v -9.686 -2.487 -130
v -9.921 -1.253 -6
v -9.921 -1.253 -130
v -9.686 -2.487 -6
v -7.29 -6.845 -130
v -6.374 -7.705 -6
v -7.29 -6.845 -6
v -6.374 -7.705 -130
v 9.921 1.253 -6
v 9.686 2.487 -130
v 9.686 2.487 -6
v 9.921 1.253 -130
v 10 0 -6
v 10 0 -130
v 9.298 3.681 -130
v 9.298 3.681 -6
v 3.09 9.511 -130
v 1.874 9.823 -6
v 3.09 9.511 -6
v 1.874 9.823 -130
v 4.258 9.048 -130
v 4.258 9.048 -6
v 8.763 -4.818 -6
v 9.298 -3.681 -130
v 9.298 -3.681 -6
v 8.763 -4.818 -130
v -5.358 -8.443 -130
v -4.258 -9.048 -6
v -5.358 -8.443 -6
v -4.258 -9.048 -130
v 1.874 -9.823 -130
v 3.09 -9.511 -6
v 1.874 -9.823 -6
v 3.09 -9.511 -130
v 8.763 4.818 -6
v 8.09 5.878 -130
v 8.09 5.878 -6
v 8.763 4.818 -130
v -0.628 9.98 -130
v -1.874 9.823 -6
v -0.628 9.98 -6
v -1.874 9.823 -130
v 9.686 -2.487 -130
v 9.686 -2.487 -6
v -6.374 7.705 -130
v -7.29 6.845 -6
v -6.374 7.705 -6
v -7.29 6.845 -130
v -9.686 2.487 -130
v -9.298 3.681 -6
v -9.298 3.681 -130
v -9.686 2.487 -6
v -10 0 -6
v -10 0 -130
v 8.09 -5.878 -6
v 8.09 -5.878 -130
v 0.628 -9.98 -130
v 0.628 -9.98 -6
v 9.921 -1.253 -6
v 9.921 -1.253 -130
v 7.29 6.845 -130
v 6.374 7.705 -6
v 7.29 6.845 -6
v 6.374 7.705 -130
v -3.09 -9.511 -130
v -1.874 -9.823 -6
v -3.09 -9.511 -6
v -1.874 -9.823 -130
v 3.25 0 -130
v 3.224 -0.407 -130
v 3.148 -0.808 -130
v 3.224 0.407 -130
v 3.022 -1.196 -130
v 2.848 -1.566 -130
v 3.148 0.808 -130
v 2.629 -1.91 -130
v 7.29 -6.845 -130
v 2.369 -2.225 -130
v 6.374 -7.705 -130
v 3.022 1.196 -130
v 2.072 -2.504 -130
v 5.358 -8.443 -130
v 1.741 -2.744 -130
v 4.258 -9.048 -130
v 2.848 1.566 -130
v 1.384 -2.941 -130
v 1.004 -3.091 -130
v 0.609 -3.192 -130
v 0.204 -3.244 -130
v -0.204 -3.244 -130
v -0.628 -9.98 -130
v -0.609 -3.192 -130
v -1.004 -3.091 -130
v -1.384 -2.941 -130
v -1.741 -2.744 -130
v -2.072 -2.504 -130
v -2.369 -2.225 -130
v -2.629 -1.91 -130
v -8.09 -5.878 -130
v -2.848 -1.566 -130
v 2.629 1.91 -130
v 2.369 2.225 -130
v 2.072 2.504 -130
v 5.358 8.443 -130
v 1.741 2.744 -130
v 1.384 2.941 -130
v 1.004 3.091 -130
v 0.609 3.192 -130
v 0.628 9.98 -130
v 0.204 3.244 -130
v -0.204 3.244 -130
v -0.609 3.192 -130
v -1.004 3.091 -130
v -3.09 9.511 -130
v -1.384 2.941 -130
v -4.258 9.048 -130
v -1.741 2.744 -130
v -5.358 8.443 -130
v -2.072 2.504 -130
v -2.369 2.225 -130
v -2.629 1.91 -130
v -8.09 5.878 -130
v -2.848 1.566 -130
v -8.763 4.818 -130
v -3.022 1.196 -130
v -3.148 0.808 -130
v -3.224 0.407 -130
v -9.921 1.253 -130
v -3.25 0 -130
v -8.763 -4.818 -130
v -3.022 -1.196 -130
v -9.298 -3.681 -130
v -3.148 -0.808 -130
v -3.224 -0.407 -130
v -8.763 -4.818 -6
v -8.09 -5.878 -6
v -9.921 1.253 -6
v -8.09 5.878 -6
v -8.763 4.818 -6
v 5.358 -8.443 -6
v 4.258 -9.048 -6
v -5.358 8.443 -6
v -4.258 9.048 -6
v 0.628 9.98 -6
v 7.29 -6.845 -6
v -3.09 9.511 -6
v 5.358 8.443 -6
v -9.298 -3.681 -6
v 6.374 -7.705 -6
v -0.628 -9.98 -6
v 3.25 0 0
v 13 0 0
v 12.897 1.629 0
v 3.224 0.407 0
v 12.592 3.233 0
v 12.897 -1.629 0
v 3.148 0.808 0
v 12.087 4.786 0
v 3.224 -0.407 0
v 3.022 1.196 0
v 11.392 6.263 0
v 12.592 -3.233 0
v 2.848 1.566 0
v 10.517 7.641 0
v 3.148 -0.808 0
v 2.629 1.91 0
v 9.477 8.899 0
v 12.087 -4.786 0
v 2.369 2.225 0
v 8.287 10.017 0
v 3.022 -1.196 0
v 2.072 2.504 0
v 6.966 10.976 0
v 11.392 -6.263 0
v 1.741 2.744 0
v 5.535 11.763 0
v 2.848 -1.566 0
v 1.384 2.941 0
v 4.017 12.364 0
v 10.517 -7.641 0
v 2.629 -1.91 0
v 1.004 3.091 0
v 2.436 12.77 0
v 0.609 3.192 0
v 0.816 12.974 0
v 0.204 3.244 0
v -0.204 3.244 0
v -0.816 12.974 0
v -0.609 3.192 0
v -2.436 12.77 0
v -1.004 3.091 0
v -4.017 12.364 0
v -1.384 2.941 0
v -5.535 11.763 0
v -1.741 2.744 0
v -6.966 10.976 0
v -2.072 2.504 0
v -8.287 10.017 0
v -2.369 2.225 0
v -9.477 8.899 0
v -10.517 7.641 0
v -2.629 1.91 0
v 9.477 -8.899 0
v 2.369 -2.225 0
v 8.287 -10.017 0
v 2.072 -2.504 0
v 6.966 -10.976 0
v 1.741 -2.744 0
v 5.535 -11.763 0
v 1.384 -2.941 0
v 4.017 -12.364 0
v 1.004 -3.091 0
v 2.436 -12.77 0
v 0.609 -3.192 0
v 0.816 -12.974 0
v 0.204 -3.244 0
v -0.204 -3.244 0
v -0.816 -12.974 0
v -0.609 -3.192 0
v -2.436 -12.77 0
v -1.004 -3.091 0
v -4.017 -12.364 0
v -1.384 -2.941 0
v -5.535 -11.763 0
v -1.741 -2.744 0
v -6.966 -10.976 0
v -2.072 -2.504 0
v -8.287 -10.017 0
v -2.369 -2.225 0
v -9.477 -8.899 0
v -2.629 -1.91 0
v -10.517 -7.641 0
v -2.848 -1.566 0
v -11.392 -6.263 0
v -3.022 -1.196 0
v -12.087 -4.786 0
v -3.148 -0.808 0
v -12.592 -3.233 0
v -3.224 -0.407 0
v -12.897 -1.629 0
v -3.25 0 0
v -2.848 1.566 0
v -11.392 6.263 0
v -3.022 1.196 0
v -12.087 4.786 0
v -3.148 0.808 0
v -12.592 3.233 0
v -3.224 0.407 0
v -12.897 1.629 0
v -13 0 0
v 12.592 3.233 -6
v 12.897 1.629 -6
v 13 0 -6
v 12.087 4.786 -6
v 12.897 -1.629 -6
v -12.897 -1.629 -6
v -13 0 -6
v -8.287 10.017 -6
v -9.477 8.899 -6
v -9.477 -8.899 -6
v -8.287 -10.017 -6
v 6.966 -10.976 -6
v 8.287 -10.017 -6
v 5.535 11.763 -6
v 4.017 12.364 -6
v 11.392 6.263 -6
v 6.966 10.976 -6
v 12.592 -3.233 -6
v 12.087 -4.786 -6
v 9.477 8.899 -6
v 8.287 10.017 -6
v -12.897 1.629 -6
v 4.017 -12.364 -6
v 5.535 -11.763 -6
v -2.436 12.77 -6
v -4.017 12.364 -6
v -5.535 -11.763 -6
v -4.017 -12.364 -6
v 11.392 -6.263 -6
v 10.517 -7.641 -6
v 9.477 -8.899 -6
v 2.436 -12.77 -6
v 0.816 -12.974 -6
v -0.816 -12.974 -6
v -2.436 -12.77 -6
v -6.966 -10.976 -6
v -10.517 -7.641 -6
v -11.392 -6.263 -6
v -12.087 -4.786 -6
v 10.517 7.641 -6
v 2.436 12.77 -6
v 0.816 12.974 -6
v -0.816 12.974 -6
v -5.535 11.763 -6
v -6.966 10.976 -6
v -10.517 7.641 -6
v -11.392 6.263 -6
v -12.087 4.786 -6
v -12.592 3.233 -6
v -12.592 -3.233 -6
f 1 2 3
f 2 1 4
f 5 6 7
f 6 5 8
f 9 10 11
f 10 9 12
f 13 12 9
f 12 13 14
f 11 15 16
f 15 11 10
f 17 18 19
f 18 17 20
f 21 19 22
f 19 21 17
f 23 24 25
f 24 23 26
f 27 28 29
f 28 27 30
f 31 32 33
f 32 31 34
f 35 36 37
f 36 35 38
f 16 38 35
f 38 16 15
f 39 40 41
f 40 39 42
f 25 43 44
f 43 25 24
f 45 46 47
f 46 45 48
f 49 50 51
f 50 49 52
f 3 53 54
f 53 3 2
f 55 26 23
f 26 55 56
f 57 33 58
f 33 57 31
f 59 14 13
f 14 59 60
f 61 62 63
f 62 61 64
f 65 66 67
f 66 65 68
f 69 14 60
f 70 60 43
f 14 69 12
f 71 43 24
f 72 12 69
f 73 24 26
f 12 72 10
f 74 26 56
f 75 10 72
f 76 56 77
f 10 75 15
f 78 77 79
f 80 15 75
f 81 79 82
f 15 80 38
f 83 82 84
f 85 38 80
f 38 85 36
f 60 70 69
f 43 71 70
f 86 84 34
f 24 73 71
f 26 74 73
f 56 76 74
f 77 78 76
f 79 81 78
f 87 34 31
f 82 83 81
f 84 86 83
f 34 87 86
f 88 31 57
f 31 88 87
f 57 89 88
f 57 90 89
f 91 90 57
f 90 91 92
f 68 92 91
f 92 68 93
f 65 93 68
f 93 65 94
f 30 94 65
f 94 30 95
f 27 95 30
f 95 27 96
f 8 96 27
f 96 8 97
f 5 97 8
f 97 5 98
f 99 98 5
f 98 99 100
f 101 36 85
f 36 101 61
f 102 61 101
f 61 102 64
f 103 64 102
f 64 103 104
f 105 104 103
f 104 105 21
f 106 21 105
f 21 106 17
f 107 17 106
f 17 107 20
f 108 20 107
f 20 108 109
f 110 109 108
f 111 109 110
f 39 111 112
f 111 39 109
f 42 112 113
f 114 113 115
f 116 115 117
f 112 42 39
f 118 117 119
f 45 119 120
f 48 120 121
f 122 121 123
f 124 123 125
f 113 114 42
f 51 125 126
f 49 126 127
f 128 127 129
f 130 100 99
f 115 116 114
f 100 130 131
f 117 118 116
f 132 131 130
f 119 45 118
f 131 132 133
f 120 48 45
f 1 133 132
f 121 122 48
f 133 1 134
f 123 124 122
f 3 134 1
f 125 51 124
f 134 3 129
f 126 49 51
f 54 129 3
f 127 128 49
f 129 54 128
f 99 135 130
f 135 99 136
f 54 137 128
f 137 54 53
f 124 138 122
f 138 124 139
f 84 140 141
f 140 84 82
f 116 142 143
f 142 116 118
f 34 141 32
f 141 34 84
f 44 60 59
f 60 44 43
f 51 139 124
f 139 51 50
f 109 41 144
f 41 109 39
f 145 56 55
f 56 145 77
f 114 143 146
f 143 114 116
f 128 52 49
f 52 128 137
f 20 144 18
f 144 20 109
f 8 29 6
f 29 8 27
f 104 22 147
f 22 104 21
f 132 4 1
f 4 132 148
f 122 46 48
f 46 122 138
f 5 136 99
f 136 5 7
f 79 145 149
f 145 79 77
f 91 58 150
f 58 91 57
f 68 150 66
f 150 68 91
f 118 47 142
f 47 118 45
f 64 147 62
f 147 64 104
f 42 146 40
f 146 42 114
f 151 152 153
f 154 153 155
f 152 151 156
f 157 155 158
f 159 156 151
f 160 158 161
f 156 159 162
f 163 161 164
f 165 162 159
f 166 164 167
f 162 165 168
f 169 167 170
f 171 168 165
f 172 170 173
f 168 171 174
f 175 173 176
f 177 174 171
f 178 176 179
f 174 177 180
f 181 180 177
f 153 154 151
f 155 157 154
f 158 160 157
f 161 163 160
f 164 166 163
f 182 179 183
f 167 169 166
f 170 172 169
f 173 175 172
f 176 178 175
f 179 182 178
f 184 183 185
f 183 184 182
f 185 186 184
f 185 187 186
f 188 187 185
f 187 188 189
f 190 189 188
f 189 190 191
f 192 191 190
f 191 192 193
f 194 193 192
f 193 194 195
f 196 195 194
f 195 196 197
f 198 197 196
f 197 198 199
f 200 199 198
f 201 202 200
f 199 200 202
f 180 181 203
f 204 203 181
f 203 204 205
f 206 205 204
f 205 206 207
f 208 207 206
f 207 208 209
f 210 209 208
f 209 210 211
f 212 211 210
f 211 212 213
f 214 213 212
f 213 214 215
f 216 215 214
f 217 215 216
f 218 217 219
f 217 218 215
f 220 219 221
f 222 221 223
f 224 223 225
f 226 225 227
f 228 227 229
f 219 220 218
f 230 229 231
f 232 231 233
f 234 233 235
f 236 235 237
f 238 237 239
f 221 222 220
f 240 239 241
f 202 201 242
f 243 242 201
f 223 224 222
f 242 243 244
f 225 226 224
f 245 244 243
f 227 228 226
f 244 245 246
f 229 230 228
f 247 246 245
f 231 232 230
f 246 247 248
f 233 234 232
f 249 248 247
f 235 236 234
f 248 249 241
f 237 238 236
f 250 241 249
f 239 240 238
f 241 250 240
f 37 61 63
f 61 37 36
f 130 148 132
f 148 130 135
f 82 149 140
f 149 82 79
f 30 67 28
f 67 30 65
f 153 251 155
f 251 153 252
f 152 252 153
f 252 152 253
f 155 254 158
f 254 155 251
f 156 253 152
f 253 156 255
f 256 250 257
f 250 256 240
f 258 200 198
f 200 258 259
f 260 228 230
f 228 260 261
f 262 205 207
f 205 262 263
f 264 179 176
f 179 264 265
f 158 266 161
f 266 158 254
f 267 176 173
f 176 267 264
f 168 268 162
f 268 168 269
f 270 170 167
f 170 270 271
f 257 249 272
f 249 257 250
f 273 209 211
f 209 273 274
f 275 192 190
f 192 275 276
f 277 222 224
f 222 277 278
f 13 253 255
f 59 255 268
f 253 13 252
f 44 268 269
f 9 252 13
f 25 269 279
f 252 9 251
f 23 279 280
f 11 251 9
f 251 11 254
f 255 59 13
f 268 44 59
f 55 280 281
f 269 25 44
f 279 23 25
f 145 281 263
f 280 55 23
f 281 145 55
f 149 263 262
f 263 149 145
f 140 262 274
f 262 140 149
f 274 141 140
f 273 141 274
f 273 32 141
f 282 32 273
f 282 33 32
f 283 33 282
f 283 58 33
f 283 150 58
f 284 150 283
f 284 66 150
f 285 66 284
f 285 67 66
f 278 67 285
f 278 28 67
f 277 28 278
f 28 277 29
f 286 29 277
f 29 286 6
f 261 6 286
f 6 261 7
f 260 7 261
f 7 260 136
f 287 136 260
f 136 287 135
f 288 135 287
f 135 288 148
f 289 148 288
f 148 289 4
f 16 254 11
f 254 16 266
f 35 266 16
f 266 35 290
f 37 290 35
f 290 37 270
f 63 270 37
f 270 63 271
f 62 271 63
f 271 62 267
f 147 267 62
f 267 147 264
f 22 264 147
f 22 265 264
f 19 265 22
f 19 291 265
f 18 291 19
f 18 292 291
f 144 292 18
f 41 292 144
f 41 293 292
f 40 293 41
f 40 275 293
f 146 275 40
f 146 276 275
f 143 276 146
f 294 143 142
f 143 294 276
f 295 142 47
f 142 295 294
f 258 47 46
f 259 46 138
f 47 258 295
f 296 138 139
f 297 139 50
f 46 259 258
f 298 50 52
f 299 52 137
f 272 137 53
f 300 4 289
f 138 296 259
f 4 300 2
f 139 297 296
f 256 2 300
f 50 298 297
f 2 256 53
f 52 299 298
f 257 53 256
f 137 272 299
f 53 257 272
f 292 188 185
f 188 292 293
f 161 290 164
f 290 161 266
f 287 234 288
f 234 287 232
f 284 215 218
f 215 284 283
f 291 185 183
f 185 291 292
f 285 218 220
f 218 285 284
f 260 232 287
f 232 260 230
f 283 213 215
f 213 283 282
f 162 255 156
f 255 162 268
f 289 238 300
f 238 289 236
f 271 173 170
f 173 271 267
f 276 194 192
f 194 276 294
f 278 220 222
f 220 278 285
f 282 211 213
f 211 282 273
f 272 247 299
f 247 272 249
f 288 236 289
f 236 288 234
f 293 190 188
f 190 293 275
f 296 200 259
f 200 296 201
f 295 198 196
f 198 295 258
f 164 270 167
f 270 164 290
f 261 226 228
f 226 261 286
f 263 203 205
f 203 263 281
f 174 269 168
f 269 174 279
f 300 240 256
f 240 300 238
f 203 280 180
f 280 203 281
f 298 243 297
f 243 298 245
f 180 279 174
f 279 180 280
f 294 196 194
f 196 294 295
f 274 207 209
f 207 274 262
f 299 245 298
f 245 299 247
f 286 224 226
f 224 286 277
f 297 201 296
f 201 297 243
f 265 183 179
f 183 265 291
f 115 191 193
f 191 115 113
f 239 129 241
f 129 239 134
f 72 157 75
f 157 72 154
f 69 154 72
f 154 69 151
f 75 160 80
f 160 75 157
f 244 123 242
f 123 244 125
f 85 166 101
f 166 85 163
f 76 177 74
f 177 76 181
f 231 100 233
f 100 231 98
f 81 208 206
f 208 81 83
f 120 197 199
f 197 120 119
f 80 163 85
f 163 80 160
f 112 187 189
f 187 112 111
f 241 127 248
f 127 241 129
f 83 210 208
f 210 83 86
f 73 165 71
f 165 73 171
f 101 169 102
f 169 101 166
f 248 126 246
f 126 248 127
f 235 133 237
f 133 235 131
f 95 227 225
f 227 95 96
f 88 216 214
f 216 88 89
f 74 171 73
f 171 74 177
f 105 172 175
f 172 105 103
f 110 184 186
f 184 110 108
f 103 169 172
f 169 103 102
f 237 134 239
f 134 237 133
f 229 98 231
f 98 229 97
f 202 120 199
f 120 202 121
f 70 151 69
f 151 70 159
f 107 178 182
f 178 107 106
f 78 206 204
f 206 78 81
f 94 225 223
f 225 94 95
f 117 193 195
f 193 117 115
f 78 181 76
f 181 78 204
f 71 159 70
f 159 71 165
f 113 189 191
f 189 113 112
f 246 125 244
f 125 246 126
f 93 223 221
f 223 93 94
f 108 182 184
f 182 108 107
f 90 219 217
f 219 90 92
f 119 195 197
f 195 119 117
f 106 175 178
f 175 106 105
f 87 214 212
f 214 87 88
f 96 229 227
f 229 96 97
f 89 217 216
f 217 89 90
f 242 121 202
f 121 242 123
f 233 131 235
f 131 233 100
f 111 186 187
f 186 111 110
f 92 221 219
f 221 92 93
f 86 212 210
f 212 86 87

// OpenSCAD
$fn = 50;


difference() {
	union() {
		translate(v = [0, 0, -130.0000000000]) {
			cylinder(h = 130, r = 10.0000000000);
		}
		translate(v = [0, 0, -6.0000000000]) {
			cylinder(h = 6, r = 13.0000000000);
		}
	}
	union() {
		#translate(v = [0, 0, -130]) {
			cylinder(h = 130, r = 3.2500000000);
		}
	}
}
